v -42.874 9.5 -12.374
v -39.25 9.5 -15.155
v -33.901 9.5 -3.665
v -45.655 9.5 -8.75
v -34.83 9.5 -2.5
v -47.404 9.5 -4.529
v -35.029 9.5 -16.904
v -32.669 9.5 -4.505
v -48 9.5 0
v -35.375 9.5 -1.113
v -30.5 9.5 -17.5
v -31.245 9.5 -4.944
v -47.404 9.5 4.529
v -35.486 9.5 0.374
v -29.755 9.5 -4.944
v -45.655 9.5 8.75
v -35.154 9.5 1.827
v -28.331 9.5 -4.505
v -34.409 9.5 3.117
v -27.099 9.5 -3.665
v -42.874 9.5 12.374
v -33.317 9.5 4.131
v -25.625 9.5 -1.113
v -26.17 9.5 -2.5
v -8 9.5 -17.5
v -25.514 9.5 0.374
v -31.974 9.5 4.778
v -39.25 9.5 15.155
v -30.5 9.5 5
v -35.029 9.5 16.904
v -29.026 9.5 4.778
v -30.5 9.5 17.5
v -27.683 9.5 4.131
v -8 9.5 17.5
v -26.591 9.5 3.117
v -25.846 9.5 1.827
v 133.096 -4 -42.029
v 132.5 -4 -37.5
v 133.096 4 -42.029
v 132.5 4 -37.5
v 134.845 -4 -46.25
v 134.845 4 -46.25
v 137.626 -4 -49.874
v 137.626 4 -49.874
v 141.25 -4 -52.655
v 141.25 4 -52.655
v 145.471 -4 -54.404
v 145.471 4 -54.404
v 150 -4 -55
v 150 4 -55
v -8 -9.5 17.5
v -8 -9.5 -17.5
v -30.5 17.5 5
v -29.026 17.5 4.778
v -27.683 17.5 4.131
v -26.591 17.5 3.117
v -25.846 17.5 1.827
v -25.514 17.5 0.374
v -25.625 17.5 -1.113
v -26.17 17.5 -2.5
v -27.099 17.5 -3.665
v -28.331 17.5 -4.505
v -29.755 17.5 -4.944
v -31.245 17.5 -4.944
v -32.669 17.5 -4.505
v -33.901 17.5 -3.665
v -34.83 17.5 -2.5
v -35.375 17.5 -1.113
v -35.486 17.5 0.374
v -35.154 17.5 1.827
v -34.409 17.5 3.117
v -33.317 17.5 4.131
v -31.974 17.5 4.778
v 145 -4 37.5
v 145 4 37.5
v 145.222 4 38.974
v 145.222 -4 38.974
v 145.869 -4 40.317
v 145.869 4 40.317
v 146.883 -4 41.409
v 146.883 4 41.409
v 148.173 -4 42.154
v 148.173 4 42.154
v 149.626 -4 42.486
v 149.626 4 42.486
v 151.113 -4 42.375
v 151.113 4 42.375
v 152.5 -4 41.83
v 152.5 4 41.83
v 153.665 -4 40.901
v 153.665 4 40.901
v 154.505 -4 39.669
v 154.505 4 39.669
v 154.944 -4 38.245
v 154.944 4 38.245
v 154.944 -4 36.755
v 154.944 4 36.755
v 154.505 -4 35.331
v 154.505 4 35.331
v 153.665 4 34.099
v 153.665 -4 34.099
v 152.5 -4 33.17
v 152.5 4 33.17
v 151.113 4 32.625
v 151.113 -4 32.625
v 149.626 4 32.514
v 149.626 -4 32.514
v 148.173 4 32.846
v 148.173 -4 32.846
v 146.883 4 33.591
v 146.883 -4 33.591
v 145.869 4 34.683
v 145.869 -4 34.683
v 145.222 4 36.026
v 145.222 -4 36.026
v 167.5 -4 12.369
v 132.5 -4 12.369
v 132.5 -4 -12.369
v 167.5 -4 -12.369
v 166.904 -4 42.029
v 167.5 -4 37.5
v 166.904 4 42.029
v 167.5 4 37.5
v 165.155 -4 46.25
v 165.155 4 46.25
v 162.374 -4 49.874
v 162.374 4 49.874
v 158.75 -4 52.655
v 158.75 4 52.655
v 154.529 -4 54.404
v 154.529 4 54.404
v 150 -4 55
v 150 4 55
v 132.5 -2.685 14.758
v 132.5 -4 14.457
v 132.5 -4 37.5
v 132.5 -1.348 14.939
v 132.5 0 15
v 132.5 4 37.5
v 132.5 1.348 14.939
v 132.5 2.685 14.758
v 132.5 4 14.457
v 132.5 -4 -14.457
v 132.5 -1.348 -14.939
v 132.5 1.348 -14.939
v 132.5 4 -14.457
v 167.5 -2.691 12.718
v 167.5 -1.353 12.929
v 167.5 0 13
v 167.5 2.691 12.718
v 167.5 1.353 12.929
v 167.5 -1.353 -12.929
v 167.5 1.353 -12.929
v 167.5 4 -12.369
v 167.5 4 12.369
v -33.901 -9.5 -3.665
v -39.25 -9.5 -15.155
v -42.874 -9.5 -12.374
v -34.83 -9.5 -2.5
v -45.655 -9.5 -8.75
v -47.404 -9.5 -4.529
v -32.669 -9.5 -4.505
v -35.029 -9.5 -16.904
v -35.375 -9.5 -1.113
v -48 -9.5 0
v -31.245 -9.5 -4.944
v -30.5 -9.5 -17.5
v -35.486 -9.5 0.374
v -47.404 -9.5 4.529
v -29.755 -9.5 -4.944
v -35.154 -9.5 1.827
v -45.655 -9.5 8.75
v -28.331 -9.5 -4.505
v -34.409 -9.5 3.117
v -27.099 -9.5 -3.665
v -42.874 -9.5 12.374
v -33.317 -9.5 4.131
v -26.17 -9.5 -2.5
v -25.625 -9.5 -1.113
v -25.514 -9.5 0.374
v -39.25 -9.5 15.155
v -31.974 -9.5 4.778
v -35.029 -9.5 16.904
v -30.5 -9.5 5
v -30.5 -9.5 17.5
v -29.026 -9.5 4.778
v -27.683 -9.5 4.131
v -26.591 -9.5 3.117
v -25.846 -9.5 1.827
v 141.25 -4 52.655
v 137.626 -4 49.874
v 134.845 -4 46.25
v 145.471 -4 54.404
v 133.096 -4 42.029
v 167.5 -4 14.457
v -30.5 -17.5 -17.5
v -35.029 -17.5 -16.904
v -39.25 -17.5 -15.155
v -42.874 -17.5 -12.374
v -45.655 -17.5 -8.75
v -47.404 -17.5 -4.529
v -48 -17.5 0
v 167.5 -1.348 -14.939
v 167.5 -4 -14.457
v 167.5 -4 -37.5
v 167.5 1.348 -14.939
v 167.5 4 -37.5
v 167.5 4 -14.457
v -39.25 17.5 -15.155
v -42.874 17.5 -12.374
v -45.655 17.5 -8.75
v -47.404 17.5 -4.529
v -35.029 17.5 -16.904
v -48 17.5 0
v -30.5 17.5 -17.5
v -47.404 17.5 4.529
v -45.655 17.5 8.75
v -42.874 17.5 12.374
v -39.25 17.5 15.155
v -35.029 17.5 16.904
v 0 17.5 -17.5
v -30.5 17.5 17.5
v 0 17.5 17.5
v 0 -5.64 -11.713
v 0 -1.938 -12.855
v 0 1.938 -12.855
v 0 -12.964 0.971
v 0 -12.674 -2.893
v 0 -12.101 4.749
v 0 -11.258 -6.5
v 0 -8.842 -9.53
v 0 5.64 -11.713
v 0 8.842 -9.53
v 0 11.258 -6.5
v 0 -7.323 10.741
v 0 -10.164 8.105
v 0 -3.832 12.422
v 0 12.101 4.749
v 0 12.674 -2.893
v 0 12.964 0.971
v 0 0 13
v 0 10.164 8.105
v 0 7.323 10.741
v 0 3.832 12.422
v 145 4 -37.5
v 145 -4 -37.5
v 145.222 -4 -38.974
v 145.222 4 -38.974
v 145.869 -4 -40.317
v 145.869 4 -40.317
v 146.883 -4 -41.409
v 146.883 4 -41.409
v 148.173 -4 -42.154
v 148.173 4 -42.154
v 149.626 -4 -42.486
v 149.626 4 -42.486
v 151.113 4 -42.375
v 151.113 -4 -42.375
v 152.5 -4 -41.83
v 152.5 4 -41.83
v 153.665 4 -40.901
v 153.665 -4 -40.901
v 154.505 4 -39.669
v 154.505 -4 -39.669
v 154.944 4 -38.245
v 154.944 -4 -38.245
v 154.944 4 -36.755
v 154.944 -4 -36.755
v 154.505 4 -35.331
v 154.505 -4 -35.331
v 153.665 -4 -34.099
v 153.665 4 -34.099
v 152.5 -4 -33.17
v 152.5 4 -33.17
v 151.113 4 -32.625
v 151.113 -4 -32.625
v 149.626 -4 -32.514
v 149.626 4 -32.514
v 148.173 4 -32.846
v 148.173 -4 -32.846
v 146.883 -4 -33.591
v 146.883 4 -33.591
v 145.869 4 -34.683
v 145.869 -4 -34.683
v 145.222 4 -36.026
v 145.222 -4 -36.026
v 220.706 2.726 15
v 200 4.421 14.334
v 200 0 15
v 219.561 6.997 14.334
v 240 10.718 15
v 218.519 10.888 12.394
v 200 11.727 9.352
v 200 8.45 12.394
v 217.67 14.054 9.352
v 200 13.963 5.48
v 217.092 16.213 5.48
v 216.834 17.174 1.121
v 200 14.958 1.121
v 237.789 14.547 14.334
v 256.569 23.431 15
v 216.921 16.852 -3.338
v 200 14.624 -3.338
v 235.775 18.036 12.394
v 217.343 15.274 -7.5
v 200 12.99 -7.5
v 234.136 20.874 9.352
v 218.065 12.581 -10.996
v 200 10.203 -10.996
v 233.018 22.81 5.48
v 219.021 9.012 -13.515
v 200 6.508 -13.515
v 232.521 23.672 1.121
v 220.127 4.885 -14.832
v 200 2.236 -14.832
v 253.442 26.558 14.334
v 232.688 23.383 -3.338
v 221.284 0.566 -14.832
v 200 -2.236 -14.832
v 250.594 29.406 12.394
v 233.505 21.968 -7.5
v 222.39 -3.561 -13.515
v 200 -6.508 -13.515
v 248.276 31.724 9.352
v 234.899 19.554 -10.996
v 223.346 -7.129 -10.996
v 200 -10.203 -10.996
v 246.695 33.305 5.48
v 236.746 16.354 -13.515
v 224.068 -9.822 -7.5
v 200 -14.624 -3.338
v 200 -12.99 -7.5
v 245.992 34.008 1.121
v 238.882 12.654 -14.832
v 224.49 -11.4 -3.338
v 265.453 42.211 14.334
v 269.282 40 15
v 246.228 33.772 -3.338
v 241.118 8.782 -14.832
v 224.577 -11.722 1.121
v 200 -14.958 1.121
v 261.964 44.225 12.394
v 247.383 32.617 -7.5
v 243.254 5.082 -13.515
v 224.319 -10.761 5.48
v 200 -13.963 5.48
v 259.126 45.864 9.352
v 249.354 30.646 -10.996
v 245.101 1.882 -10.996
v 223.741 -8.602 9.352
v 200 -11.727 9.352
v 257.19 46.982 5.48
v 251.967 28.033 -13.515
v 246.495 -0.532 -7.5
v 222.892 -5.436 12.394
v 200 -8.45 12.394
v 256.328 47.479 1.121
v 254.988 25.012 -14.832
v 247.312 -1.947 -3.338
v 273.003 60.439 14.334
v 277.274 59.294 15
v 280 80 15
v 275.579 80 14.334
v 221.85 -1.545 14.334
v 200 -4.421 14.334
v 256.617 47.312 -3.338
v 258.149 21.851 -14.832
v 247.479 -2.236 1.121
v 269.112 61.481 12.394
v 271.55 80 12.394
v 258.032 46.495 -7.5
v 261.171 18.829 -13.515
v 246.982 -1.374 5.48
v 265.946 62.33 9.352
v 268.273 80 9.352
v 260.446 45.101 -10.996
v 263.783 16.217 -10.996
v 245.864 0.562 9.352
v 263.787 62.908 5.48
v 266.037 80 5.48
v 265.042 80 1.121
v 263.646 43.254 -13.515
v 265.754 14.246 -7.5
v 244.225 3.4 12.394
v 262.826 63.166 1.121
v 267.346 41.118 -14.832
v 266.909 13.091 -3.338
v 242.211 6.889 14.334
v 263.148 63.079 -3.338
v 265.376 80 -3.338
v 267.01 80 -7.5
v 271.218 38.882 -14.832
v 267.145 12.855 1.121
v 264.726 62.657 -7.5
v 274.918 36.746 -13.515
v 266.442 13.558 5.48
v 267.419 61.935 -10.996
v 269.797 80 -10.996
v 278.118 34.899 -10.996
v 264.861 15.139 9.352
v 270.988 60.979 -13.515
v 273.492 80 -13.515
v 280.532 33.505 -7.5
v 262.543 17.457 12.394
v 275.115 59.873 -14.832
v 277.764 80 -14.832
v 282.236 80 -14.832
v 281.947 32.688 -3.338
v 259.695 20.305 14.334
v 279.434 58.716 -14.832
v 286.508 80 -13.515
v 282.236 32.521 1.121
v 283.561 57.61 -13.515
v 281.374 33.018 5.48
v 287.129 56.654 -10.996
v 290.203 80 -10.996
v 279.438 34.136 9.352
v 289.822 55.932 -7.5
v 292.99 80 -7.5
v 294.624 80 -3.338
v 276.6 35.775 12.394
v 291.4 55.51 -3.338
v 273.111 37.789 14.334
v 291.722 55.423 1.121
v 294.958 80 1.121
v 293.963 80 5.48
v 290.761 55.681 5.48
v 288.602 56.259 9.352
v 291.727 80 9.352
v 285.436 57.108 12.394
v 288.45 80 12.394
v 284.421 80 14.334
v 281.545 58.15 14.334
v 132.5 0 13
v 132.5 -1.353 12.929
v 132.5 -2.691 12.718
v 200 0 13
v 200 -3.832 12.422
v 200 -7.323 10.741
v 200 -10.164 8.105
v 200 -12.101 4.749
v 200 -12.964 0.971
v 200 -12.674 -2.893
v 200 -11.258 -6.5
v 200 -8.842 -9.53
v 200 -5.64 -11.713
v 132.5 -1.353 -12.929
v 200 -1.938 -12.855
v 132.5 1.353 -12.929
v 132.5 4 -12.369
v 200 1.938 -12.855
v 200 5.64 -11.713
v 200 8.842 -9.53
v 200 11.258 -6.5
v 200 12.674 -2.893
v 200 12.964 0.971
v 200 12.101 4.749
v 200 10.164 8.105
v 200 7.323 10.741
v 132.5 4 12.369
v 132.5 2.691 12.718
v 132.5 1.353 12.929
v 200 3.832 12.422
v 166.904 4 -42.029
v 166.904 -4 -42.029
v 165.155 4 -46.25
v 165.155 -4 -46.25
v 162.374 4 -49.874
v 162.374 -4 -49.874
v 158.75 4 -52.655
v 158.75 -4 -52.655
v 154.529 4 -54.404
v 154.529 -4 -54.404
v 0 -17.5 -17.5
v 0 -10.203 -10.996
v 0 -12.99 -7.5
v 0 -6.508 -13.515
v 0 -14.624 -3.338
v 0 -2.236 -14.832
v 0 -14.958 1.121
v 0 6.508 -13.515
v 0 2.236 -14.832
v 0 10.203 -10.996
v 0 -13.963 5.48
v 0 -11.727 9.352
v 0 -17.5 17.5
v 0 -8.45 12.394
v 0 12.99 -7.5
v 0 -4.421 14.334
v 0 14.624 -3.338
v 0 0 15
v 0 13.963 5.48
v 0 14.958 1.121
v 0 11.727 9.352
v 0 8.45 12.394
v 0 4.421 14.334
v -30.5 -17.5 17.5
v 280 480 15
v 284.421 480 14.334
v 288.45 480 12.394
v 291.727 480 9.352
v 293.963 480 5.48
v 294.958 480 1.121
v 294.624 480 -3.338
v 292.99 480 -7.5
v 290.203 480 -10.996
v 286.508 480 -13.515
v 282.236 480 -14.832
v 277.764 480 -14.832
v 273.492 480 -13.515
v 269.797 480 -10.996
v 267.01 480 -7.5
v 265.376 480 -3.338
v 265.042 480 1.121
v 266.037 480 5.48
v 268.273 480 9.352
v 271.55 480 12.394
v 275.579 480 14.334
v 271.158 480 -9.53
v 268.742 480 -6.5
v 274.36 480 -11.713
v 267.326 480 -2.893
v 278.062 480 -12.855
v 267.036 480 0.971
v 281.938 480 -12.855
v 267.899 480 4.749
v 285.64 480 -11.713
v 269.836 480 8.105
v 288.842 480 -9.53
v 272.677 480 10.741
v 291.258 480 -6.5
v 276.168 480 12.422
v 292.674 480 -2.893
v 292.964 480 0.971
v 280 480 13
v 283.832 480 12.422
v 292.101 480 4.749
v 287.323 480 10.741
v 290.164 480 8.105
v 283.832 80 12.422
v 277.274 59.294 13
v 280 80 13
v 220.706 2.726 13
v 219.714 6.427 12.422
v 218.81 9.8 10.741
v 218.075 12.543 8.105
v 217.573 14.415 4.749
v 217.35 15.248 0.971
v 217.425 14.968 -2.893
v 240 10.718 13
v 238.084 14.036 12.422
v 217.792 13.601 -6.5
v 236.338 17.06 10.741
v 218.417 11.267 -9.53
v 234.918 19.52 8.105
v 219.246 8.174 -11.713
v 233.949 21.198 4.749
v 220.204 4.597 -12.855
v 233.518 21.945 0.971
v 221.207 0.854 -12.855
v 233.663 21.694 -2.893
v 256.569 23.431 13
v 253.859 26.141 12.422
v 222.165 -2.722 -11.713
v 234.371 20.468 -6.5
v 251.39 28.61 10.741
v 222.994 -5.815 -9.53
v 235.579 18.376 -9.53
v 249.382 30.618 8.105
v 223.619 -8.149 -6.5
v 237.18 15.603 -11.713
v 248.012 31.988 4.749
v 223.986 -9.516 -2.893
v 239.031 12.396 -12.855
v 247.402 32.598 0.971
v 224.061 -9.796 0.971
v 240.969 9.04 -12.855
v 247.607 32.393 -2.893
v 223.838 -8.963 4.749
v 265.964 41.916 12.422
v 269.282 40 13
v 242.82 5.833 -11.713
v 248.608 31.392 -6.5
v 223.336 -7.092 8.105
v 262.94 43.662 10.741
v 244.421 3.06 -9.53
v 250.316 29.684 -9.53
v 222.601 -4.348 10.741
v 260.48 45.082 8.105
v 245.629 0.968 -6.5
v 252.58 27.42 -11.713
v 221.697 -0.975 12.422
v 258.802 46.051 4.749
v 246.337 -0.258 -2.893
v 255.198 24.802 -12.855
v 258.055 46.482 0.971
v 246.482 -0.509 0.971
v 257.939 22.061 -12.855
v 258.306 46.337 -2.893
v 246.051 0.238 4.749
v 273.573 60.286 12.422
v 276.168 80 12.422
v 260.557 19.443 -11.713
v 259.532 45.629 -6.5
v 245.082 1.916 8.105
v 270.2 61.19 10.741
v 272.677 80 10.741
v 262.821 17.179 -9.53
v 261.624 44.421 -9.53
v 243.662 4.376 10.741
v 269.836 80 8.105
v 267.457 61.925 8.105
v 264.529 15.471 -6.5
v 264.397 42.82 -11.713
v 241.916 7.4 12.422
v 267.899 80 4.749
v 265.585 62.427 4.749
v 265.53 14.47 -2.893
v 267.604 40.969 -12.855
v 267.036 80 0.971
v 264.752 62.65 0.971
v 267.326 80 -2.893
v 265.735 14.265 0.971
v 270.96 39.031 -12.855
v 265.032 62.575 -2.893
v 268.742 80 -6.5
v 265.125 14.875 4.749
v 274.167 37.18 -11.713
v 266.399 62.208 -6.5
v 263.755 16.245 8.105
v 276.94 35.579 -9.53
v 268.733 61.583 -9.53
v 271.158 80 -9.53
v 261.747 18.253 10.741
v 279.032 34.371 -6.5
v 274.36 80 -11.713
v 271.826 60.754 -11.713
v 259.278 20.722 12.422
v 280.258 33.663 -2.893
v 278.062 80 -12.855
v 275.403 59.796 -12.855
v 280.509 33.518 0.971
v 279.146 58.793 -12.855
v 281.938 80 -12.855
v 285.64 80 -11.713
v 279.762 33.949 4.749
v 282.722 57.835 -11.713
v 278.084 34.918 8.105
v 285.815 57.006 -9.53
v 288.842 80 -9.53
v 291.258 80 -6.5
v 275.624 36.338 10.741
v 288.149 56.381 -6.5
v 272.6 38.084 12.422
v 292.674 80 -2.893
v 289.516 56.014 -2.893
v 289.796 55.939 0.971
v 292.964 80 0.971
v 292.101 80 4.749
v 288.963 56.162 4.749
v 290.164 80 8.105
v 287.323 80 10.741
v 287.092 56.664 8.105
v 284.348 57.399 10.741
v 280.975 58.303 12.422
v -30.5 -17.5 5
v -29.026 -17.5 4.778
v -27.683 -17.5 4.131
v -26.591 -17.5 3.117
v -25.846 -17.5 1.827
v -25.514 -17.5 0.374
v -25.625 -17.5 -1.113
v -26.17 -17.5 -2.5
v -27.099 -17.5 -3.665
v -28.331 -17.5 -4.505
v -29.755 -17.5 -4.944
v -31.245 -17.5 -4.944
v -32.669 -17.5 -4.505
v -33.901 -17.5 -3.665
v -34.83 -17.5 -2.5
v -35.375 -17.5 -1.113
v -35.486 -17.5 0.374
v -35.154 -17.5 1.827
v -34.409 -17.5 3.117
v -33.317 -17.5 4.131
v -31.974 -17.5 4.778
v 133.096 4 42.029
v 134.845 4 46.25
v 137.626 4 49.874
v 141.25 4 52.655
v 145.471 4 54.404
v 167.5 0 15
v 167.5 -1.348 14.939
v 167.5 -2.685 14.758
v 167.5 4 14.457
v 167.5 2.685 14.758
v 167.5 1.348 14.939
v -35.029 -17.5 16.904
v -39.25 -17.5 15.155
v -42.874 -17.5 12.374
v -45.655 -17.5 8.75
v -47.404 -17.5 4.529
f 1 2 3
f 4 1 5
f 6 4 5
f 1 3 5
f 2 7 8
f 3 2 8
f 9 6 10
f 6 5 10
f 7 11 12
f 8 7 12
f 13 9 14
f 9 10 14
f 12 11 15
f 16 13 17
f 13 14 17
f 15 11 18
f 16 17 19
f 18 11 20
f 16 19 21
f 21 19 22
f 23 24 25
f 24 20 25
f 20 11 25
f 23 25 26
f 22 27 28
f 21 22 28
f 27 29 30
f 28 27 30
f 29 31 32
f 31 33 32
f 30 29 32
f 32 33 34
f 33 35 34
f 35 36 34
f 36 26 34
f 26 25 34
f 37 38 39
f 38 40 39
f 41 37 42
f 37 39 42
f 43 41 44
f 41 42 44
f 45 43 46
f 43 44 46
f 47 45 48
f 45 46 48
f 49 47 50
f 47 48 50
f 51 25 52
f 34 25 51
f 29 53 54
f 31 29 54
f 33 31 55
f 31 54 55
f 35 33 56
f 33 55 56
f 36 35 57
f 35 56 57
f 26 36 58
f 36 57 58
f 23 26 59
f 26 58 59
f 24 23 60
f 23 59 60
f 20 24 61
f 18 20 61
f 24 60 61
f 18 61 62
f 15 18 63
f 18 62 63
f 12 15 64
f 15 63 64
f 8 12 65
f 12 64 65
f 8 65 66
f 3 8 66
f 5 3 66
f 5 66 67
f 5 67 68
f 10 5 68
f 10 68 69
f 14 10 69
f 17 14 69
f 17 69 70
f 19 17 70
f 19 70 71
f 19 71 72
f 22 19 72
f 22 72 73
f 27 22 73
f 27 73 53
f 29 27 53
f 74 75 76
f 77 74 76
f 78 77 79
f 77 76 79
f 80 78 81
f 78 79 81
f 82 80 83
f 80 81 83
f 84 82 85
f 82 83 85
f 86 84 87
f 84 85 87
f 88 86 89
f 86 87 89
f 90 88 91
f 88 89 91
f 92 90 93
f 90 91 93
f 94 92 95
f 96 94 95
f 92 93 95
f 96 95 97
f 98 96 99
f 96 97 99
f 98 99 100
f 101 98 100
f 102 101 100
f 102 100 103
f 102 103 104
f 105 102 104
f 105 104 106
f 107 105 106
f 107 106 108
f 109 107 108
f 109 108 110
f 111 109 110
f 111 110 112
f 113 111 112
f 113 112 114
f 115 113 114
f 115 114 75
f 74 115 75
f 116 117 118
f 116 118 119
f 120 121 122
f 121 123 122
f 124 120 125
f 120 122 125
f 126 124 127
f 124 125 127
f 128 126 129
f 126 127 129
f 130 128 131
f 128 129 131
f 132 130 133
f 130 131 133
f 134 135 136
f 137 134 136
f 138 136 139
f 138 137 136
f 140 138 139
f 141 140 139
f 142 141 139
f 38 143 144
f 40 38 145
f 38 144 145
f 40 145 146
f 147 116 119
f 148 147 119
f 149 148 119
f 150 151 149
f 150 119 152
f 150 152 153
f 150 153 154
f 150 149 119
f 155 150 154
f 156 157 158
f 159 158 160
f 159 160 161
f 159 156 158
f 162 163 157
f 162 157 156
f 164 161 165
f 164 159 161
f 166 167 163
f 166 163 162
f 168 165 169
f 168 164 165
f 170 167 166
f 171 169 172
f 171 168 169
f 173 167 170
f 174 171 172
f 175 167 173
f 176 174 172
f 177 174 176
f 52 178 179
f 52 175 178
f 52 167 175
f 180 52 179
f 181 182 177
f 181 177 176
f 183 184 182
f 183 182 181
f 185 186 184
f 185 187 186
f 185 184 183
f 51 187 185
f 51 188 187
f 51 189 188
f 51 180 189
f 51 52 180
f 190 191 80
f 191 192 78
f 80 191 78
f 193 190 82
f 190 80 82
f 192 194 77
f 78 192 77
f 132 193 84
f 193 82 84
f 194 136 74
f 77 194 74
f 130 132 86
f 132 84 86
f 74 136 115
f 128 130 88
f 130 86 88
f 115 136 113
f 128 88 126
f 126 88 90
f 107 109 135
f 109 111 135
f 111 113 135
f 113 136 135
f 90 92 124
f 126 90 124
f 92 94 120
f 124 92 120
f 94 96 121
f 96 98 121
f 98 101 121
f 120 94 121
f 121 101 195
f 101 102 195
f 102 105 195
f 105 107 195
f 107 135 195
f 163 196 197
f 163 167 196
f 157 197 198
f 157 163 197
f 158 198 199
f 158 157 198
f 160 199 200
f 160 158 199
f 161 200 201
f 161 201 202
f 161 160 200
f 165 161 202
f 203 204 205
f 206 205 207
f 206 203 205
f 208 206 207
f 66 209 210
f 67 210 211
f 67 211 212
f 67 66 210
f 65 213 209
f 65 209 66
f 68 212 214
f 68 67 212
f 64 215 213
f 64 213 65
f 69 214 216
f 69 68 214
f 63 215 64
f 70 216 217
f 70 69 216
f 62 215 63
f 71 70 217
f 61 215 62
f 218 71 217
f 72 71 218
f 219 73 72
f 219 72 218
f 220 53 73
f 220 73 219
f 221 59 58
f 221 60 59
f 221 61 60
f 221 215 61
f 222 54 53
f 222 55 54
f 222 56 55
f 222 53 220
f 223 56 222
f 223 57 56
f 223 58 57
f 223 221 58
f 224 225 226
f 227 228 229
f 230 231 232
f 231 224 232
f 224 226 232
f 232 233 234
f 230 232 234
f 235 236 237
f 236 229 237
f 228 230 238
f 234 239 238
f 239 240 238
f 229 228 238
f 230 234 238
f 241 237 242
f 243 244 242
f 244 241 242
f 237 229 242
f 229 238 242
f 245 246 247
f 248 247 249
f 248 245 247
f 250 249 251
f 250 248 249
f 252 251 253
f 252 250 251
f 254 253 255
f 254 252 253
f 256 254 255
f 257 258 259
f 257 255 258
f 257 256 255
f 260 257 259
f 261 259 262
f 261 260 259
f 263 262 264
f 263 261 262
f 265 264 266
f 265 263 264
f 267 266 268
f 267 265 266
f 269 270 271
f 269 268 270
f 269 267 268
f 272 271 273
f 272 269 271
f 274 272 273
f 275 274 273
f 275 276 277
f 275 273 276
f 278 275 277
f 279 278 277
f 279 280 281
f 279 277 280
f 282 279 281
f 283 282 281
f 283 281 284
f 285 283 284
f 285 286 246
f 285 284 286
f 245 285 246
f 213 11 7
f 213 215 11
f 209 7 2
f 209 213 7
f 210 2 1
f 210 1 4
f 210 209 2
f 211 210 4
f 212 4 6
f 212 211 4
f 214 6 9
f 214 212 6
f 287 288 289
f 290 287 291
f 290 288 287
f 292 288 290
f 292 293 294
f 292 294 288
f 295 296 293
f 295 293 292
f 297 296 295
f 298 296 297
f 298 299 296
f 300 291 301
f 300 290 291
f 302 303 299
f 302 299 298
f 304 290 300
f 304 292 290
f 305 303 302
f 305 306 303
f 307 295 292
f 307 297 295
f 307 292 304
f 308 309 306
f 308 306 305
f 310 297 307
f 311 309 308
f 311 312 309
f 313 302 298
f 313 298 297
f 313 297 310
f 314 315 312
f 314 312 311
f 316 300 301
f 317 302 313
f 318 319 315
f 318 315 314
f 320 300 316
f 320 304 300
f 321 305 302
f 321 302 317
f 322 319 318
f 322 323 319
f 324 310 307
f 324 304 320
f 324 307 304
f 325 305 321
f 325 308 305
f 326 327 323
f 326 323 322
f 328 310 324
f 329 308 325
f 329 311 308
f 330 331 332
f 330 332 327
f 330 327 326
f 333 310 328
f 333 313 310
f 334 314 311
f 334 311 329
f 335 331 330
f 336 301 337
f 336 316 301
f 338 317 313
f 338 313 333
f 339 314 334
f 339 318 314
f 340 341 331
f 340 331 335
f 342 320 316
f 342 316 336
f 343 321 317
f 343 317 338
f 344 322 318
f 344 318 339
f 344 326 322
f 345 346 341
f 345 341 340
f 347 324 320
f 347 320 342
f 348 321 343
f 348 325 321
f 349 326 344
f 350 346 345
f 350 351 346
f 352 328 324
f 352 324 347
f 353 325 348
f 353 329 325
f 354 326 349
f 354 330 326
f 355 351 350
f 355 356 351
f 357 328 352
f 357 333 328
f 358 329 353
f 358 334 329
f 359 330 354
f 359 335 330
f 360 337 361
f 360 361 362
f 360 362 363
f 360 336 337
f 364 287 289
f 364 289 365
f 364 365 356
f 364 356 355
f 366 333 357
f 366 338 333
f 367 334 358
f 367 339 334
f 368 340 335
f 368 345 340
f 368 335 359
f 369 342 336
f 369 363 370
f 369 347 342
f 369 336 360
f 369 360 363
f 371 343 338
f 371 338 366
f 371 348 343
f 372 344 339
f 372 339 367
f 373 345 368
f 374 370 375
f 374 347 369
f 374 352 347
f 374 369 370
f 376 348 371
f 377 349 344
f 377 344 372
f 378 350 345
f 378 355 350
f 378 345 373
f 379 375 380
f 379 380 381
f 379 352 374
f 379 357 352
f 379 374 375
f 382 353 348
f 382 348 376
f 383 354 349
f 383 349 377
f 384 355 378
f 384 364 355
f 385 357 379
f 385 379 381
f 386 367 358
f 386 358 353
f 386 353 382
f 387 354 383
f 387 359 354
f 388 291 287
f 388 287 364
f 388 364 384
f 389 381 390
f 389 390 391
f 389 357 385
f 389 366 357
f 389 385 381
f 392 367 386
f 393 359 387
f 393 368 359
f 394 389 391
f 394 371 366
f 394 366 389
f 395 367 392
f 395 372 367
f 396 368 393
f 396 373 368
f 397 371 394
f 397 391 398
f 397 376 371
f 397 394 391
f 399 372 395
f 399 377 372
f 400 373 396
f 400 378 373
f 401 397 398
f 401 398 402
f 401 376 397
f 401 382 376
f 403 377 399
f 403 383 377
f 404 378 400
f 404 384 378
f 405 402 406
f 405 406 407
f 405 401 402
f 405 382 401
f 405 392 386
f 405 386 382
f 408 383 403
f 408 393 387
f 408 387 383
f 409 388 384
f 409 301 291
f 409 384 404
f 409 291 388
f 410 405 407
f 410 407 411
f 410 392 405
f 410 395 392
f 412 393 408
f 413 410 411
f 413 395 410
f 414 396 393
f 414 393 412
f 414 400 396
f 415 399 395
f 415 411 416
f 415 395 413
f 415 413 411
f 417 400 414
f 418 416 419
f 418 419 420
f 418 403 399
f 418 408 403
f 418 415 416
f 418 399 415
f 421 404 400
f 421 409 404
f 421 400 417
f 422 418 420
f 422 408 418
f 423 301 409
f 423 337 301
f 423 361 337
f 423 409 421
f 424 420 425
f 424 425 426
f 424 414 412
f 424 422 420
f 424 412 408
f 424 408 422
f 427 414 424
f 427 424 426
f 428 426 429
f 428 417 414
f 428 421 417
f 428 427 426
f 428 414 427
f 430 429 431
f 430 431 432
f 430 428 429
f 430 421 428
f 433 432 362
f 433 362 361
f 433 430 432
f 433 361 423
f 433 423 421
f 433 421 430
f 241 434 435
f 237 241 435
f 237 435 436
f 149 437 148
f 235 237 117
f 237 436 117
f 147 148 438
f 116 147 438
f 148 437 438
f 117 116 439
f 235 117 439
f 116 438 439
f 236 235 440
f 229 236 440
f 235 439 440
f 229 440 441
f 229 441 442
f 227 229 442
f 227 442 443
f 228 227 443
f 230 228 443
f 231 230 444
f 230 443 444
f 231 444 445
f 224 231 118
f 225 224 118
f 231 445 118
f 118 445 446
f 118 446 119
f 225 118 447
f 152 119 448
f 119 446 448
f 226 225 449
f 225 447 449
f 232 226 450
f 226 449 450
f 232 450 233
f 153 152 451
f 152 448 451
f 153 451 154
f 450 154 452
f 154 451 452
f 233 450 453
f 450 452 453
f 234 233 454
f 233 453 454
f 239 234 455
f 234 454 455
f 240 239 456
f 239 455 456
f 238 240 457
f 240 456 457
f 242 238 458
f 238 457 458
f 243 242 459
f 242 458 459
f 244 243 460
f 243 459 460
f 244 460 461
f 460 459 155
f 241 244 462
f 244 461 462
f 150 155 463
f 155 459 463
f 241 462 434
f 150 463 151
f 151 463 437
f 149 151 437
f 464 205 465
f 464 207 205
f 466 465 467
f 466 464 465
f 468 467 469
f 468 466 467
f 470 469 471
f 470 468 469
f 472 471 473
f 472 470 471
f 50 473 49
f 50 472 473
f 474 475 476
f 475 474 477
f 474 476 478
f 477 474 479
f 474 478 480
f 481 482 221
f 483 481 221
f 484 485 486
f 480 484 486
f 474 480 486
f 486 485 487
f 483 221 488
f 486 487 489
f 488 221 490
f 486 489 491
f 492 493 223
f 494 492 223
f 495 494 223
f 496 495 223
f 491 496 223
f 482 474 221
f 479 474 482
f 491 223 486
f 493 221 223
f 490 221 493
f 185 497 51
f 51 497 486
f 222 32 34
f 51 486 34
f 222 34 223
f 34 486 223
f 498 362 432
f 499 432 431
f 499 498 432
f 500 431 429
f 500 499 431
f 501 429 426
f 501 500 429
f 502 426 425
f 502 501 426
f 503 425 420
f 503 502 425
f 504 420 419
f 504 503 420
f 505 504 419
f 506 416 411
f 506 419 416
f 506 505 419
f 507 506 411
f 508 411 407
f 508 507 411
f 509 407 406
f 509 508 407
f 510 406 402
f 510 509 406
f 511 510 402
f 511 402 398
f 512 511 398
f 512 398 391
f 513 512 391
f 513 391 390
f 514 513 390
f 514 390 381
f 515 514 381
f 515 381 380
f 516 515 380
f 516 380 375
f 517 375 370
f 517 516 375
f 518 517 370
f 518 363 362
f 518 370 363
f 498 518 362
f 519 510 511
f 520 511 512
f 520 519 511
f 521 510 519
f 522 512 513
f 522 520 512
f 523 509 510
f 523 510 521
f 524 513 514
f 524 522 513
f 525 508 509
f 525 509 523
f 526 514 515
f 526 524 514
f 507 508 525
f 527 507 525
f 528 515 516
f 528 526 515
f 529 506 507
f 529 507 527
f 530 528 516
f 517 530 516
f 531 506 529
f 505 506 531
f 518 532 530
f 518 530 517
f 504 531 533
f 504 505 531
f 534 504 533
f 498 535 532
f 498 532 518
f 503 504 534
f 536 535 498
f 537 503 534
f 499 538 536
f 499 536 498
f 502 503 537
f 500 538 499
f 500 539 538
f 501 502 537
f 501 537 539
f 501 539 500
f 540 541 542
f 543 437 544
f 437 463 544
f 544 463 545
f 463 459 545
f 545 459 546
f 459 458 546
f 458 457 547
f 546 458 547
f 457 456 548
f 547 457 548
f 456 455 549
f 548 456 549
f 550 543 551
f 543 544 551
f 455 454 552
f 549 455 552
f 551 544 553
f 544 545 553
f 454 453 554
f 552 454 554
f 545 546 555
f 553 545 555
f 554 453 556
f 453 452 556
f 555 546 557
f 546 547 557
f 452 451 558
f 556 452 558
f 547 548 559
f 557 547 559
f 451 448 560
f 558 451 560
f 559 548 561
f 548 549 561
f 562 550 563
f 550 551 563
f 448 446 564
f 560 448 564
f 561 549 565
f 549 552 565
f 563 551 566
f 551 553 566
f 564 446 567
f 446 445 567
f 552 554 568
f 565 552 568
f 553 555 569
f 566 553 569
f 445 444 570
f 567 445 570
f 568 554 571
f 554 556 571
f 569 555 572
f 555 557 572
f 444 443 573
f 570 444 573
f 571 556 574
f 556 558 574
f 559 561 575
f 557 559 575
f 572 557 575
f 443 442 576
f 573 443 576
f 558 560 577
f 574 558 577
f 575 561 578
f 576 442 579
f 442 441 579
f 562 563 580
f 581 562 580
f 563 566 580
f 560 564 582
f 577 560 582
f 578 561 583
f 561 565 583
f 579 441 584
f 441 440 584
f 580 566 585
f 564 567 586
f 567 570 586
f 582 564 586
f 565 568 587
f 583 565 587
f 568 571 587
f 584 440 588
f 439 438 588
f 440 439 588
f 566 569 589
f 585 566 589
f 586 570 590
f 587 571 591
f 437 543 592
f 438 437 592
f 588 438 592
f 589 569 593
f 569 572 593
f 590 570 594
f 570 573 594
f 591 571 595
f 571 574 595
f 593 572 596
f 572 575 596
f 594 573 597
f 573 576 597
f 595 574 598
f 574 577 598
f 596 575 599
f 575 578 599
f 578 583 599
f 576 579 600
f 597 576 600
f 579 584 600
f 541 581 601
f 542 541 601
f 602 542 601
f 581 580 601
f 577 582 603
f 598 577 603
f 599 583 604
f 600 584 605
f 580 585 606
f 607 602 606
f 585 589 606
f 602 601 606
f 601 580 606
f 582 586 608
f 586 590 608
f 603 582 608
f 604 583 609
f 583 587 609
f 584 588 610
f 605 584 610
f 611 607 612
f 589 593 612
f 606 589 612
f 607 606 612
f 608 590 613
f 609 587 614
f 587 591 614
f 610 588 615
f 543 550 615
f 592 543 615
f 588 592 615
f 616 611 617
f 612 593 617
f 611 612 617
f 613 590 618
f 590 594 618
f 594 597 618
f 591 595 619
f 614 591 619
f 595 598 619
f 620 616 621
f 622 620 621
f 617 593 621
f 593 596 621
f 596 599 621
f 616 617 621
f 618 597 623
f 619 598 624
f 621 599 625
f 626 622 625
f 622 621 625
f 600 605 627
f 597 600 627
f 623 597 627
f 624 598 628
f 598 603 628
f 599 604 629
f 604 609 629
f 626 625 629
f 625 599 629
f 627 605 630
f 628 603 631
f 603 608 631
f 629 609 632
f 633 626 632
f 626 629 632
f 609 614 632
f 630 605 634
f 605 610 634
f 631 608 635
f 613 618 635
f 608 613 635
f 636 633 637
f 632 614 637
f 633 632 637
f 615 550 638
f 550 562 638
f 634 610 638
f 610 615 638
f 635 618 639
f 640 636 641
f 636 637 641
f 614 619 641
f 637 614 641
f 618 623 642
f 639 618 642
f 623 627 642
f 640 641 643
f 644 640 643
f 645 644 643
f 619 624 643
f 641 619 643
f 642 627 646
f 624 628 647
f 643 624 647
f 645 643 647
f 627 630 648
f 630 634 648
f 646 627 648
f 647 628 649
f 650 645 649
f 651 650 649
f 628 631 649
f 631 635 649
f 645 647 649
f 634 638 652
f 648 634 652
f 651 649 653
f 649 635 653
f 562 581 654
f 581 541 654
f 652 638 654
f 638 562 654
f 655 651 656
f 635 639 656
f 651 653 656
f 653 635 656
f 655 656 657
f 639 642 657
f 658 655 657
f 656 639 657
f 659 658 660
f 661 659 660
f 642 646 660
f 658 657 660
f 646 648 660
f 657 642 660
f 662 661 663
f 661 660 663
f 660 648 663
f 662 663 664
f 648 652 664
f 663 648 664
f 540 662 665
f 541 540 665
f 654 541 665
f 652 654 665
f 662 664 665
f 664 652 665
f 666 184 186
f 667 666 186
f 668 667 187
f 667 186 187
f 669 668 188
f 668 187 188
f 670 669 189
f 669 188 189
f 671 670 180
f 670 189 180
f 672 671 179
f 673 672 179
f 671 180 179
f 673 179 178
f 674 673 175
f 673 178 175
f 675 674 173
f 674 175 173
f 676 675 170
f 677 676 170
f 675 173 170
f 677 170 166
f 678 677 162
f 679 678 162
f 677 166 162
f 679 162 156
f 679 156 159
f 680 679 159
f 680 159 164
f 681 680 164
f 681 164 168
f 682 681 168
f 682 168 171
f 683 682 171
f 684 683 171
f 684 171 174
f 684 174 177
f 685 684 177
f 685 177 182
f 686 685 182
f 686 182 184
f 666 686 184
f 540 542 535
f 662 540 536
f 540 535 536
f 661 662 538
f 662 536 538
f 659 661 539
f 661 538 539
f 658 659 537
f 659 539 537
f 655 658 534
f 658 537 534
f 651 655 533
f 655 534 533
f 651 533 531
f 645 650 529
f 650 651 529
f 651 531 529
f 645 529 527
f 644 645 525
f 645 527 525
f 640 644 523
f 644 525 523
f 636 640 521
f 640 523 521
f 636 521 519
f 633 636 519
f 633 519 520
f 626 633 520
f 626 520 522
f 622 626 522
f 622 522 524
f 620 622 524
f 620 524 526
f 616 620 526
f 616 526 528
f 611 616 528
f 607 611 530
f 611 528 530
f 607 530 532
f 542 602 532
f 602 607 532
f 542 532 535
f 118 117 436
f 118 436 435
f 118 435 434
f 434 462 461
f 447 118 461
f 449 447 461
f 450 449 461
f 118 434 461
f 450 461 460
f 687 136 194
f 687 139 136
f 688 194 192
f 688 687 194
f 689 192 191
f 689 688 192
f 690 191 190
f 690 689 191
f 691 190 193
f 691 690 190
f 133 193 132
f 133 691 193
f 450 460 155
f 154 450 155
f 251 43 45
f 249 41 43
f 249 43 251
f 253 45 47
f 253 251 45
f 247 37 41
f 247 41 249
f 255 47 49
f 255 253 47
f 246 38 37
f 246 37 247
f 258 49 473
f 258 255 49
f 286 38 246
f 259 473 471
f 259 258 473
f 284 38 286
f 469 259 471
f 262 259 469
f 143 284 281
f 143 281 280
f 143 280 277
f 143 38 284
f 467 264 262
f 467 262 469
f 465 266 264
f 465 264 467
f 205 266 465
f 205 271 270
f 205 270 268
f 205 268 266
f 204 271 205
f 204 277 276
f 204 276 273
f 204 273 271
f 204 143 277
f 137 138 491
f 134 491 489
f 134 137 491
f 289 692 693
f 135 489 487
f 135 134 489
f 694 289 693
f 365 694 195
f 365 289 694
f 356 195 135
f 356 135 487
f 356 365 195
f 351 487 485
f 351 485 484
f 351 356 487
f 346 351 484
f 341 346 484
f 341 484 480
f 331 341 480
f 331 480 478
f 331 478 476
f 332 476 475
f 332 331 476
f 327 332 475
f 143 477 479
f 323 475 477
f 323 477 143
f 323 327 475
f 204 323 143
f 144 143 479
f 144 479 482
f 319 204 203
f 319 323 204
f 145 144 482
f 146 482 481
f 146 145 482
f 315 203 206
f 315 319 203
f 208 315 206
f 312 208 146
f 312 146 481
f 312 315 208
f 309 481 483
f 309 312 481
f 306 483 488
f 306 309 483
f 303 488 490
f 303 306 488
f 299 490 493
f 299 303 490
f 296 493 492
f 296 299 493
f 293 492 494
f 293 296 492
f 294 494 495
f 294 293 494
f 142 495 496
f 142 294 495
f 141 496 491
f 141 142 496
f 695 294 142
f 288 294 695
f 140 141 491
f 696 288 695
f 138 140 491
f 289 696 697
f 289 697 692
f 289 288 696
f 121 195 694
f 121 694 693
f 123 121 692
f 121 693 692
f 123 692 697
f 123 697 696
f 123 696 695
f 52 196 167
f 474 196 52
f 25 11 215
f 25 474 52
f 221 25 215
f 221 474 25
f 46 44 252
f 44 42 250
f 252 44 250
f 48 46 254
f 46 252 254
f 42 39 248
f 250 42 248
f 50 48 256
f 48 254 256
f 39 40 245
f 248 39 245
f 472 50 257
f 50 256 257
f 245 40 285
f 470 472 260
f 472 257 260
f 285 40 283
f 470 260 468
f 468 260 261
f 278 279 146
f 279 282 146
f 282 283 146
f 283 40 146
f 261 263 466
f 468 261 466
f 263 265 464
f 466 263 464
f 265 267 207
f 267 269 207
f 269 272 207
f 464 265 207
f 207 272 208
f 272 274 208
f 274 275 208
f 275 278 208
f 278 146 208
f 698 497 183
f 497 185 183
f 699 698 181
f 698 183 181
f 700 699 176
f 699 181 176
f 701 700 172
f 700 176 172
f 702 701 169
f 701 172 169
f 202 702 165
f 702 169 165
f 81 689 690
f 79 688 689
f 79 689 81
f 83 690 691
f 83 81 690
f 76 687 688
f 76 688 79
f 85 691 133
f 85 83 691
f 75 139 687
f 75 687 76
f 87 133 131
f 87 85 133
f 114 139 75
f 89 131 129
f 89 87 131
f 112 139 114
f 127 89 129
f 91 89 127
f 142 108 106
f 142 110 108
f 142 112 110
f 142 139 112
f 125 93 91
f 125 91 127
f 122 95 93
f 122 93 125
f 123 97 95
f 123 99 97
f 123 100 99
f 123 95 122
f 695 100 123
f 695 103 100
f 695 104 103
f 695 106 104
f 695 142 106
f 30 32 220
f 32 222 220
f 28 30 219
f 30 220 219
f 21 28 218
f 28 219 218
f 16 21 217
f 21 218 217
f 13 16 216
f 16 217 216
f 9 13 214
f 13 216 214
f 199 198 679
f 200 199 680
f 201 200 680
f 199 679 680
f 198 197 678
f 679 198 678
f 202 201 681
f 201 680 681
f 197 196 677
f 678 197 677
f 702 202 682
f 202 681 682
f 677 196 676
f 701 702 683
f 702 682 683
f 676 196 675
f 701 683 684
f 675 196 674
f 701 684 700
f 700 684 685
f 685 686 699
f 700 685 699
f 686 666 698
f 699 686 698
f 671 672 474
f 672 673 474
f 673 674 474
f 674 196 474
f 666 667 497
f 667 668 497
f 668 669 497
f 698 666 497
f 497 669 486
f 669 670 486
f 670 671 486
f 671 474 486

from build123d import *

# Parameters (mm, degrees)
SWEEP_THIN3_PROFILE_R   = 15
SWEEP_THIN3_PROFILE_R_2 = 13
SKETCH57_W              = 35
SKETCH57_H              = 35
BOSS_EXTRUDE1_DEPTH     = 8
SKETCH58_W              = 35
SKETCH58_H              = 8
BOSS_EXTRUDE2_DEPTH     = 40
FILLET1_R               = 17.5
SKETCH59_R              = 5
CUT_EXTRUDE1_DEPTH      = 549.85107275
SKETCH60_W              = 35
SKETCH60_H              = 8
BOSS_EXTRUDE3_DEPTH     = 55
FILLET2_R               = 17.5
SKETCH61_R              = 5
CUT_EXTRUDE2_DEPTH      = 55
FILLET2_OF_MIRROR1_R    = 17.5


with BuildPart() as part:
    # Sweep-Thin3: sweep along a path in Sketch44
    with BuildLine(Plane.XY) as sweep_thin3_path:
        Line((0, 0), (200, 0))
        ThreePointArc((200, 0), (256.568542495, 23.431457505), (280, 80))
        Line((280, 80), (280, 480))
    # Sweep-Thin3 profile (on start of the path) → Sweep-Thin3 (sweep)
    with BuildSketch(Plane(origin=(0, 0, 0), x_dir=(0, 0, 1), z_dir=(1, 0, 0))):
        Circle(SWEEP_THIN3_PROFILE_R)
        Circle(SWEEP_THIN3_PROFILE_R_2, mode=Mode.SUBTRACT)
    sweep(path=sweep_thin3_path.line)

    # Sketch57 → Boss-Extrude1 (add)
    with BuildSketch(Plane.ZY):
        Rectangle(SKETCH57_W, SKETCH57_H)
    extrude(amount=BOSS_EXTRUDE1_DEPTH)

    # Sketch58 → Boss-Extrude2 (add)
    with BuildSketch(Plane.ZY.offset(8)):
        with Locations((0, 13.5)):
            Rectangle(SKETCH58_W, SKETCH58_H)
        with Locations((0, -13.5)):
            Rectangle(SKETCH58_W, SKETCH58_H)
    extrude(amount=BOSS_EXTRUDE2_DEPTH)

    # Fillet1
    fillet1_edges = [part.edges().sort_by_distance(p)[0] for p in [
        (-48, -13.5, 17.5),
        (-48, -13.5, -17.5),
        (-48, 13.5, 17.5),
        (-48, 13.5, -17.5),
    ]]
    fillet(fillet1_edges, radius=FILLET1_R - 0.0001)  # a hair under: the kernel refuses the full size

    # Sketch59 → Cut-Extrude1 (cut, through all)
    with BuildSketch(Plane(origin=(0, 17.5, 0), x_dir=(1, 0, 0), z_dir=(0, 1, 0))):
        with Locations(Location((-30.5, 0, 0), (0, 0, 270))):
            Circle(SKETCH59_R)
    extrude(amount=-CUT_EXTRUDE1_DEPTH, mode=Mode.SUBTRACT)

    # Sketch60 → Boss-Extrude3 (add)
    with BuildSketch(Plane.XY):
        with Locations((150, 0)):
            Rectangle(SKETCH60_W, SKETCH60_H)
    boss_extrude3 = extrude(amount=BOSS_EXTRUDE3_DEPTH)

    # Fillet2
    fillet2_edges = [part.edges().sort_by_distance(p)[0] for p in [
        (132.5, 0, 55),
        (167.5, 0, 55),
    ]]
    fillet(fillet2_edges, radius=FILLET2_R - 0.0001)  # a hair under: the kernel refuses the full size

    # Sketch61 → Cut-Extrude2 (cut)
    with BuildSketch(Plane(origin=(0, 4, 0), x_dir=(1, 0, 0), z_dir=(0, 1, 0))):
        with Locations(Location((150, -37.5, 0), (0, 0, 180))):
            Circle(SKETCH61_R)
    cut_extrude2 = extrude(amount=-CUT_EXTRUDE2_DEPTH, mode=Mode.SUBTRACT)

    # Mirror1: Boss-Extrude3, Cut-Extrude2 across plane
    add(boss_extrude3.mirror(Plane.XY))
    add(cut_extrude2.mirror(Plane.XY), mode=Mode.SUBTRACT)

    # Fillet2 of Mirror1
    fillet2_of_mirror1_edges = [part.edges().sort_by_distance(p)[0] for p in [
        (132.5, 0, -55),
        (167.5, 0, -55),
    ]]
    fillet(fillet2_of_mirror1_edges, radius=FILLET2_OF_MIRROR1_R - 0.0001)  # a hair under: the kernel refuses the full size


solid = part.part
